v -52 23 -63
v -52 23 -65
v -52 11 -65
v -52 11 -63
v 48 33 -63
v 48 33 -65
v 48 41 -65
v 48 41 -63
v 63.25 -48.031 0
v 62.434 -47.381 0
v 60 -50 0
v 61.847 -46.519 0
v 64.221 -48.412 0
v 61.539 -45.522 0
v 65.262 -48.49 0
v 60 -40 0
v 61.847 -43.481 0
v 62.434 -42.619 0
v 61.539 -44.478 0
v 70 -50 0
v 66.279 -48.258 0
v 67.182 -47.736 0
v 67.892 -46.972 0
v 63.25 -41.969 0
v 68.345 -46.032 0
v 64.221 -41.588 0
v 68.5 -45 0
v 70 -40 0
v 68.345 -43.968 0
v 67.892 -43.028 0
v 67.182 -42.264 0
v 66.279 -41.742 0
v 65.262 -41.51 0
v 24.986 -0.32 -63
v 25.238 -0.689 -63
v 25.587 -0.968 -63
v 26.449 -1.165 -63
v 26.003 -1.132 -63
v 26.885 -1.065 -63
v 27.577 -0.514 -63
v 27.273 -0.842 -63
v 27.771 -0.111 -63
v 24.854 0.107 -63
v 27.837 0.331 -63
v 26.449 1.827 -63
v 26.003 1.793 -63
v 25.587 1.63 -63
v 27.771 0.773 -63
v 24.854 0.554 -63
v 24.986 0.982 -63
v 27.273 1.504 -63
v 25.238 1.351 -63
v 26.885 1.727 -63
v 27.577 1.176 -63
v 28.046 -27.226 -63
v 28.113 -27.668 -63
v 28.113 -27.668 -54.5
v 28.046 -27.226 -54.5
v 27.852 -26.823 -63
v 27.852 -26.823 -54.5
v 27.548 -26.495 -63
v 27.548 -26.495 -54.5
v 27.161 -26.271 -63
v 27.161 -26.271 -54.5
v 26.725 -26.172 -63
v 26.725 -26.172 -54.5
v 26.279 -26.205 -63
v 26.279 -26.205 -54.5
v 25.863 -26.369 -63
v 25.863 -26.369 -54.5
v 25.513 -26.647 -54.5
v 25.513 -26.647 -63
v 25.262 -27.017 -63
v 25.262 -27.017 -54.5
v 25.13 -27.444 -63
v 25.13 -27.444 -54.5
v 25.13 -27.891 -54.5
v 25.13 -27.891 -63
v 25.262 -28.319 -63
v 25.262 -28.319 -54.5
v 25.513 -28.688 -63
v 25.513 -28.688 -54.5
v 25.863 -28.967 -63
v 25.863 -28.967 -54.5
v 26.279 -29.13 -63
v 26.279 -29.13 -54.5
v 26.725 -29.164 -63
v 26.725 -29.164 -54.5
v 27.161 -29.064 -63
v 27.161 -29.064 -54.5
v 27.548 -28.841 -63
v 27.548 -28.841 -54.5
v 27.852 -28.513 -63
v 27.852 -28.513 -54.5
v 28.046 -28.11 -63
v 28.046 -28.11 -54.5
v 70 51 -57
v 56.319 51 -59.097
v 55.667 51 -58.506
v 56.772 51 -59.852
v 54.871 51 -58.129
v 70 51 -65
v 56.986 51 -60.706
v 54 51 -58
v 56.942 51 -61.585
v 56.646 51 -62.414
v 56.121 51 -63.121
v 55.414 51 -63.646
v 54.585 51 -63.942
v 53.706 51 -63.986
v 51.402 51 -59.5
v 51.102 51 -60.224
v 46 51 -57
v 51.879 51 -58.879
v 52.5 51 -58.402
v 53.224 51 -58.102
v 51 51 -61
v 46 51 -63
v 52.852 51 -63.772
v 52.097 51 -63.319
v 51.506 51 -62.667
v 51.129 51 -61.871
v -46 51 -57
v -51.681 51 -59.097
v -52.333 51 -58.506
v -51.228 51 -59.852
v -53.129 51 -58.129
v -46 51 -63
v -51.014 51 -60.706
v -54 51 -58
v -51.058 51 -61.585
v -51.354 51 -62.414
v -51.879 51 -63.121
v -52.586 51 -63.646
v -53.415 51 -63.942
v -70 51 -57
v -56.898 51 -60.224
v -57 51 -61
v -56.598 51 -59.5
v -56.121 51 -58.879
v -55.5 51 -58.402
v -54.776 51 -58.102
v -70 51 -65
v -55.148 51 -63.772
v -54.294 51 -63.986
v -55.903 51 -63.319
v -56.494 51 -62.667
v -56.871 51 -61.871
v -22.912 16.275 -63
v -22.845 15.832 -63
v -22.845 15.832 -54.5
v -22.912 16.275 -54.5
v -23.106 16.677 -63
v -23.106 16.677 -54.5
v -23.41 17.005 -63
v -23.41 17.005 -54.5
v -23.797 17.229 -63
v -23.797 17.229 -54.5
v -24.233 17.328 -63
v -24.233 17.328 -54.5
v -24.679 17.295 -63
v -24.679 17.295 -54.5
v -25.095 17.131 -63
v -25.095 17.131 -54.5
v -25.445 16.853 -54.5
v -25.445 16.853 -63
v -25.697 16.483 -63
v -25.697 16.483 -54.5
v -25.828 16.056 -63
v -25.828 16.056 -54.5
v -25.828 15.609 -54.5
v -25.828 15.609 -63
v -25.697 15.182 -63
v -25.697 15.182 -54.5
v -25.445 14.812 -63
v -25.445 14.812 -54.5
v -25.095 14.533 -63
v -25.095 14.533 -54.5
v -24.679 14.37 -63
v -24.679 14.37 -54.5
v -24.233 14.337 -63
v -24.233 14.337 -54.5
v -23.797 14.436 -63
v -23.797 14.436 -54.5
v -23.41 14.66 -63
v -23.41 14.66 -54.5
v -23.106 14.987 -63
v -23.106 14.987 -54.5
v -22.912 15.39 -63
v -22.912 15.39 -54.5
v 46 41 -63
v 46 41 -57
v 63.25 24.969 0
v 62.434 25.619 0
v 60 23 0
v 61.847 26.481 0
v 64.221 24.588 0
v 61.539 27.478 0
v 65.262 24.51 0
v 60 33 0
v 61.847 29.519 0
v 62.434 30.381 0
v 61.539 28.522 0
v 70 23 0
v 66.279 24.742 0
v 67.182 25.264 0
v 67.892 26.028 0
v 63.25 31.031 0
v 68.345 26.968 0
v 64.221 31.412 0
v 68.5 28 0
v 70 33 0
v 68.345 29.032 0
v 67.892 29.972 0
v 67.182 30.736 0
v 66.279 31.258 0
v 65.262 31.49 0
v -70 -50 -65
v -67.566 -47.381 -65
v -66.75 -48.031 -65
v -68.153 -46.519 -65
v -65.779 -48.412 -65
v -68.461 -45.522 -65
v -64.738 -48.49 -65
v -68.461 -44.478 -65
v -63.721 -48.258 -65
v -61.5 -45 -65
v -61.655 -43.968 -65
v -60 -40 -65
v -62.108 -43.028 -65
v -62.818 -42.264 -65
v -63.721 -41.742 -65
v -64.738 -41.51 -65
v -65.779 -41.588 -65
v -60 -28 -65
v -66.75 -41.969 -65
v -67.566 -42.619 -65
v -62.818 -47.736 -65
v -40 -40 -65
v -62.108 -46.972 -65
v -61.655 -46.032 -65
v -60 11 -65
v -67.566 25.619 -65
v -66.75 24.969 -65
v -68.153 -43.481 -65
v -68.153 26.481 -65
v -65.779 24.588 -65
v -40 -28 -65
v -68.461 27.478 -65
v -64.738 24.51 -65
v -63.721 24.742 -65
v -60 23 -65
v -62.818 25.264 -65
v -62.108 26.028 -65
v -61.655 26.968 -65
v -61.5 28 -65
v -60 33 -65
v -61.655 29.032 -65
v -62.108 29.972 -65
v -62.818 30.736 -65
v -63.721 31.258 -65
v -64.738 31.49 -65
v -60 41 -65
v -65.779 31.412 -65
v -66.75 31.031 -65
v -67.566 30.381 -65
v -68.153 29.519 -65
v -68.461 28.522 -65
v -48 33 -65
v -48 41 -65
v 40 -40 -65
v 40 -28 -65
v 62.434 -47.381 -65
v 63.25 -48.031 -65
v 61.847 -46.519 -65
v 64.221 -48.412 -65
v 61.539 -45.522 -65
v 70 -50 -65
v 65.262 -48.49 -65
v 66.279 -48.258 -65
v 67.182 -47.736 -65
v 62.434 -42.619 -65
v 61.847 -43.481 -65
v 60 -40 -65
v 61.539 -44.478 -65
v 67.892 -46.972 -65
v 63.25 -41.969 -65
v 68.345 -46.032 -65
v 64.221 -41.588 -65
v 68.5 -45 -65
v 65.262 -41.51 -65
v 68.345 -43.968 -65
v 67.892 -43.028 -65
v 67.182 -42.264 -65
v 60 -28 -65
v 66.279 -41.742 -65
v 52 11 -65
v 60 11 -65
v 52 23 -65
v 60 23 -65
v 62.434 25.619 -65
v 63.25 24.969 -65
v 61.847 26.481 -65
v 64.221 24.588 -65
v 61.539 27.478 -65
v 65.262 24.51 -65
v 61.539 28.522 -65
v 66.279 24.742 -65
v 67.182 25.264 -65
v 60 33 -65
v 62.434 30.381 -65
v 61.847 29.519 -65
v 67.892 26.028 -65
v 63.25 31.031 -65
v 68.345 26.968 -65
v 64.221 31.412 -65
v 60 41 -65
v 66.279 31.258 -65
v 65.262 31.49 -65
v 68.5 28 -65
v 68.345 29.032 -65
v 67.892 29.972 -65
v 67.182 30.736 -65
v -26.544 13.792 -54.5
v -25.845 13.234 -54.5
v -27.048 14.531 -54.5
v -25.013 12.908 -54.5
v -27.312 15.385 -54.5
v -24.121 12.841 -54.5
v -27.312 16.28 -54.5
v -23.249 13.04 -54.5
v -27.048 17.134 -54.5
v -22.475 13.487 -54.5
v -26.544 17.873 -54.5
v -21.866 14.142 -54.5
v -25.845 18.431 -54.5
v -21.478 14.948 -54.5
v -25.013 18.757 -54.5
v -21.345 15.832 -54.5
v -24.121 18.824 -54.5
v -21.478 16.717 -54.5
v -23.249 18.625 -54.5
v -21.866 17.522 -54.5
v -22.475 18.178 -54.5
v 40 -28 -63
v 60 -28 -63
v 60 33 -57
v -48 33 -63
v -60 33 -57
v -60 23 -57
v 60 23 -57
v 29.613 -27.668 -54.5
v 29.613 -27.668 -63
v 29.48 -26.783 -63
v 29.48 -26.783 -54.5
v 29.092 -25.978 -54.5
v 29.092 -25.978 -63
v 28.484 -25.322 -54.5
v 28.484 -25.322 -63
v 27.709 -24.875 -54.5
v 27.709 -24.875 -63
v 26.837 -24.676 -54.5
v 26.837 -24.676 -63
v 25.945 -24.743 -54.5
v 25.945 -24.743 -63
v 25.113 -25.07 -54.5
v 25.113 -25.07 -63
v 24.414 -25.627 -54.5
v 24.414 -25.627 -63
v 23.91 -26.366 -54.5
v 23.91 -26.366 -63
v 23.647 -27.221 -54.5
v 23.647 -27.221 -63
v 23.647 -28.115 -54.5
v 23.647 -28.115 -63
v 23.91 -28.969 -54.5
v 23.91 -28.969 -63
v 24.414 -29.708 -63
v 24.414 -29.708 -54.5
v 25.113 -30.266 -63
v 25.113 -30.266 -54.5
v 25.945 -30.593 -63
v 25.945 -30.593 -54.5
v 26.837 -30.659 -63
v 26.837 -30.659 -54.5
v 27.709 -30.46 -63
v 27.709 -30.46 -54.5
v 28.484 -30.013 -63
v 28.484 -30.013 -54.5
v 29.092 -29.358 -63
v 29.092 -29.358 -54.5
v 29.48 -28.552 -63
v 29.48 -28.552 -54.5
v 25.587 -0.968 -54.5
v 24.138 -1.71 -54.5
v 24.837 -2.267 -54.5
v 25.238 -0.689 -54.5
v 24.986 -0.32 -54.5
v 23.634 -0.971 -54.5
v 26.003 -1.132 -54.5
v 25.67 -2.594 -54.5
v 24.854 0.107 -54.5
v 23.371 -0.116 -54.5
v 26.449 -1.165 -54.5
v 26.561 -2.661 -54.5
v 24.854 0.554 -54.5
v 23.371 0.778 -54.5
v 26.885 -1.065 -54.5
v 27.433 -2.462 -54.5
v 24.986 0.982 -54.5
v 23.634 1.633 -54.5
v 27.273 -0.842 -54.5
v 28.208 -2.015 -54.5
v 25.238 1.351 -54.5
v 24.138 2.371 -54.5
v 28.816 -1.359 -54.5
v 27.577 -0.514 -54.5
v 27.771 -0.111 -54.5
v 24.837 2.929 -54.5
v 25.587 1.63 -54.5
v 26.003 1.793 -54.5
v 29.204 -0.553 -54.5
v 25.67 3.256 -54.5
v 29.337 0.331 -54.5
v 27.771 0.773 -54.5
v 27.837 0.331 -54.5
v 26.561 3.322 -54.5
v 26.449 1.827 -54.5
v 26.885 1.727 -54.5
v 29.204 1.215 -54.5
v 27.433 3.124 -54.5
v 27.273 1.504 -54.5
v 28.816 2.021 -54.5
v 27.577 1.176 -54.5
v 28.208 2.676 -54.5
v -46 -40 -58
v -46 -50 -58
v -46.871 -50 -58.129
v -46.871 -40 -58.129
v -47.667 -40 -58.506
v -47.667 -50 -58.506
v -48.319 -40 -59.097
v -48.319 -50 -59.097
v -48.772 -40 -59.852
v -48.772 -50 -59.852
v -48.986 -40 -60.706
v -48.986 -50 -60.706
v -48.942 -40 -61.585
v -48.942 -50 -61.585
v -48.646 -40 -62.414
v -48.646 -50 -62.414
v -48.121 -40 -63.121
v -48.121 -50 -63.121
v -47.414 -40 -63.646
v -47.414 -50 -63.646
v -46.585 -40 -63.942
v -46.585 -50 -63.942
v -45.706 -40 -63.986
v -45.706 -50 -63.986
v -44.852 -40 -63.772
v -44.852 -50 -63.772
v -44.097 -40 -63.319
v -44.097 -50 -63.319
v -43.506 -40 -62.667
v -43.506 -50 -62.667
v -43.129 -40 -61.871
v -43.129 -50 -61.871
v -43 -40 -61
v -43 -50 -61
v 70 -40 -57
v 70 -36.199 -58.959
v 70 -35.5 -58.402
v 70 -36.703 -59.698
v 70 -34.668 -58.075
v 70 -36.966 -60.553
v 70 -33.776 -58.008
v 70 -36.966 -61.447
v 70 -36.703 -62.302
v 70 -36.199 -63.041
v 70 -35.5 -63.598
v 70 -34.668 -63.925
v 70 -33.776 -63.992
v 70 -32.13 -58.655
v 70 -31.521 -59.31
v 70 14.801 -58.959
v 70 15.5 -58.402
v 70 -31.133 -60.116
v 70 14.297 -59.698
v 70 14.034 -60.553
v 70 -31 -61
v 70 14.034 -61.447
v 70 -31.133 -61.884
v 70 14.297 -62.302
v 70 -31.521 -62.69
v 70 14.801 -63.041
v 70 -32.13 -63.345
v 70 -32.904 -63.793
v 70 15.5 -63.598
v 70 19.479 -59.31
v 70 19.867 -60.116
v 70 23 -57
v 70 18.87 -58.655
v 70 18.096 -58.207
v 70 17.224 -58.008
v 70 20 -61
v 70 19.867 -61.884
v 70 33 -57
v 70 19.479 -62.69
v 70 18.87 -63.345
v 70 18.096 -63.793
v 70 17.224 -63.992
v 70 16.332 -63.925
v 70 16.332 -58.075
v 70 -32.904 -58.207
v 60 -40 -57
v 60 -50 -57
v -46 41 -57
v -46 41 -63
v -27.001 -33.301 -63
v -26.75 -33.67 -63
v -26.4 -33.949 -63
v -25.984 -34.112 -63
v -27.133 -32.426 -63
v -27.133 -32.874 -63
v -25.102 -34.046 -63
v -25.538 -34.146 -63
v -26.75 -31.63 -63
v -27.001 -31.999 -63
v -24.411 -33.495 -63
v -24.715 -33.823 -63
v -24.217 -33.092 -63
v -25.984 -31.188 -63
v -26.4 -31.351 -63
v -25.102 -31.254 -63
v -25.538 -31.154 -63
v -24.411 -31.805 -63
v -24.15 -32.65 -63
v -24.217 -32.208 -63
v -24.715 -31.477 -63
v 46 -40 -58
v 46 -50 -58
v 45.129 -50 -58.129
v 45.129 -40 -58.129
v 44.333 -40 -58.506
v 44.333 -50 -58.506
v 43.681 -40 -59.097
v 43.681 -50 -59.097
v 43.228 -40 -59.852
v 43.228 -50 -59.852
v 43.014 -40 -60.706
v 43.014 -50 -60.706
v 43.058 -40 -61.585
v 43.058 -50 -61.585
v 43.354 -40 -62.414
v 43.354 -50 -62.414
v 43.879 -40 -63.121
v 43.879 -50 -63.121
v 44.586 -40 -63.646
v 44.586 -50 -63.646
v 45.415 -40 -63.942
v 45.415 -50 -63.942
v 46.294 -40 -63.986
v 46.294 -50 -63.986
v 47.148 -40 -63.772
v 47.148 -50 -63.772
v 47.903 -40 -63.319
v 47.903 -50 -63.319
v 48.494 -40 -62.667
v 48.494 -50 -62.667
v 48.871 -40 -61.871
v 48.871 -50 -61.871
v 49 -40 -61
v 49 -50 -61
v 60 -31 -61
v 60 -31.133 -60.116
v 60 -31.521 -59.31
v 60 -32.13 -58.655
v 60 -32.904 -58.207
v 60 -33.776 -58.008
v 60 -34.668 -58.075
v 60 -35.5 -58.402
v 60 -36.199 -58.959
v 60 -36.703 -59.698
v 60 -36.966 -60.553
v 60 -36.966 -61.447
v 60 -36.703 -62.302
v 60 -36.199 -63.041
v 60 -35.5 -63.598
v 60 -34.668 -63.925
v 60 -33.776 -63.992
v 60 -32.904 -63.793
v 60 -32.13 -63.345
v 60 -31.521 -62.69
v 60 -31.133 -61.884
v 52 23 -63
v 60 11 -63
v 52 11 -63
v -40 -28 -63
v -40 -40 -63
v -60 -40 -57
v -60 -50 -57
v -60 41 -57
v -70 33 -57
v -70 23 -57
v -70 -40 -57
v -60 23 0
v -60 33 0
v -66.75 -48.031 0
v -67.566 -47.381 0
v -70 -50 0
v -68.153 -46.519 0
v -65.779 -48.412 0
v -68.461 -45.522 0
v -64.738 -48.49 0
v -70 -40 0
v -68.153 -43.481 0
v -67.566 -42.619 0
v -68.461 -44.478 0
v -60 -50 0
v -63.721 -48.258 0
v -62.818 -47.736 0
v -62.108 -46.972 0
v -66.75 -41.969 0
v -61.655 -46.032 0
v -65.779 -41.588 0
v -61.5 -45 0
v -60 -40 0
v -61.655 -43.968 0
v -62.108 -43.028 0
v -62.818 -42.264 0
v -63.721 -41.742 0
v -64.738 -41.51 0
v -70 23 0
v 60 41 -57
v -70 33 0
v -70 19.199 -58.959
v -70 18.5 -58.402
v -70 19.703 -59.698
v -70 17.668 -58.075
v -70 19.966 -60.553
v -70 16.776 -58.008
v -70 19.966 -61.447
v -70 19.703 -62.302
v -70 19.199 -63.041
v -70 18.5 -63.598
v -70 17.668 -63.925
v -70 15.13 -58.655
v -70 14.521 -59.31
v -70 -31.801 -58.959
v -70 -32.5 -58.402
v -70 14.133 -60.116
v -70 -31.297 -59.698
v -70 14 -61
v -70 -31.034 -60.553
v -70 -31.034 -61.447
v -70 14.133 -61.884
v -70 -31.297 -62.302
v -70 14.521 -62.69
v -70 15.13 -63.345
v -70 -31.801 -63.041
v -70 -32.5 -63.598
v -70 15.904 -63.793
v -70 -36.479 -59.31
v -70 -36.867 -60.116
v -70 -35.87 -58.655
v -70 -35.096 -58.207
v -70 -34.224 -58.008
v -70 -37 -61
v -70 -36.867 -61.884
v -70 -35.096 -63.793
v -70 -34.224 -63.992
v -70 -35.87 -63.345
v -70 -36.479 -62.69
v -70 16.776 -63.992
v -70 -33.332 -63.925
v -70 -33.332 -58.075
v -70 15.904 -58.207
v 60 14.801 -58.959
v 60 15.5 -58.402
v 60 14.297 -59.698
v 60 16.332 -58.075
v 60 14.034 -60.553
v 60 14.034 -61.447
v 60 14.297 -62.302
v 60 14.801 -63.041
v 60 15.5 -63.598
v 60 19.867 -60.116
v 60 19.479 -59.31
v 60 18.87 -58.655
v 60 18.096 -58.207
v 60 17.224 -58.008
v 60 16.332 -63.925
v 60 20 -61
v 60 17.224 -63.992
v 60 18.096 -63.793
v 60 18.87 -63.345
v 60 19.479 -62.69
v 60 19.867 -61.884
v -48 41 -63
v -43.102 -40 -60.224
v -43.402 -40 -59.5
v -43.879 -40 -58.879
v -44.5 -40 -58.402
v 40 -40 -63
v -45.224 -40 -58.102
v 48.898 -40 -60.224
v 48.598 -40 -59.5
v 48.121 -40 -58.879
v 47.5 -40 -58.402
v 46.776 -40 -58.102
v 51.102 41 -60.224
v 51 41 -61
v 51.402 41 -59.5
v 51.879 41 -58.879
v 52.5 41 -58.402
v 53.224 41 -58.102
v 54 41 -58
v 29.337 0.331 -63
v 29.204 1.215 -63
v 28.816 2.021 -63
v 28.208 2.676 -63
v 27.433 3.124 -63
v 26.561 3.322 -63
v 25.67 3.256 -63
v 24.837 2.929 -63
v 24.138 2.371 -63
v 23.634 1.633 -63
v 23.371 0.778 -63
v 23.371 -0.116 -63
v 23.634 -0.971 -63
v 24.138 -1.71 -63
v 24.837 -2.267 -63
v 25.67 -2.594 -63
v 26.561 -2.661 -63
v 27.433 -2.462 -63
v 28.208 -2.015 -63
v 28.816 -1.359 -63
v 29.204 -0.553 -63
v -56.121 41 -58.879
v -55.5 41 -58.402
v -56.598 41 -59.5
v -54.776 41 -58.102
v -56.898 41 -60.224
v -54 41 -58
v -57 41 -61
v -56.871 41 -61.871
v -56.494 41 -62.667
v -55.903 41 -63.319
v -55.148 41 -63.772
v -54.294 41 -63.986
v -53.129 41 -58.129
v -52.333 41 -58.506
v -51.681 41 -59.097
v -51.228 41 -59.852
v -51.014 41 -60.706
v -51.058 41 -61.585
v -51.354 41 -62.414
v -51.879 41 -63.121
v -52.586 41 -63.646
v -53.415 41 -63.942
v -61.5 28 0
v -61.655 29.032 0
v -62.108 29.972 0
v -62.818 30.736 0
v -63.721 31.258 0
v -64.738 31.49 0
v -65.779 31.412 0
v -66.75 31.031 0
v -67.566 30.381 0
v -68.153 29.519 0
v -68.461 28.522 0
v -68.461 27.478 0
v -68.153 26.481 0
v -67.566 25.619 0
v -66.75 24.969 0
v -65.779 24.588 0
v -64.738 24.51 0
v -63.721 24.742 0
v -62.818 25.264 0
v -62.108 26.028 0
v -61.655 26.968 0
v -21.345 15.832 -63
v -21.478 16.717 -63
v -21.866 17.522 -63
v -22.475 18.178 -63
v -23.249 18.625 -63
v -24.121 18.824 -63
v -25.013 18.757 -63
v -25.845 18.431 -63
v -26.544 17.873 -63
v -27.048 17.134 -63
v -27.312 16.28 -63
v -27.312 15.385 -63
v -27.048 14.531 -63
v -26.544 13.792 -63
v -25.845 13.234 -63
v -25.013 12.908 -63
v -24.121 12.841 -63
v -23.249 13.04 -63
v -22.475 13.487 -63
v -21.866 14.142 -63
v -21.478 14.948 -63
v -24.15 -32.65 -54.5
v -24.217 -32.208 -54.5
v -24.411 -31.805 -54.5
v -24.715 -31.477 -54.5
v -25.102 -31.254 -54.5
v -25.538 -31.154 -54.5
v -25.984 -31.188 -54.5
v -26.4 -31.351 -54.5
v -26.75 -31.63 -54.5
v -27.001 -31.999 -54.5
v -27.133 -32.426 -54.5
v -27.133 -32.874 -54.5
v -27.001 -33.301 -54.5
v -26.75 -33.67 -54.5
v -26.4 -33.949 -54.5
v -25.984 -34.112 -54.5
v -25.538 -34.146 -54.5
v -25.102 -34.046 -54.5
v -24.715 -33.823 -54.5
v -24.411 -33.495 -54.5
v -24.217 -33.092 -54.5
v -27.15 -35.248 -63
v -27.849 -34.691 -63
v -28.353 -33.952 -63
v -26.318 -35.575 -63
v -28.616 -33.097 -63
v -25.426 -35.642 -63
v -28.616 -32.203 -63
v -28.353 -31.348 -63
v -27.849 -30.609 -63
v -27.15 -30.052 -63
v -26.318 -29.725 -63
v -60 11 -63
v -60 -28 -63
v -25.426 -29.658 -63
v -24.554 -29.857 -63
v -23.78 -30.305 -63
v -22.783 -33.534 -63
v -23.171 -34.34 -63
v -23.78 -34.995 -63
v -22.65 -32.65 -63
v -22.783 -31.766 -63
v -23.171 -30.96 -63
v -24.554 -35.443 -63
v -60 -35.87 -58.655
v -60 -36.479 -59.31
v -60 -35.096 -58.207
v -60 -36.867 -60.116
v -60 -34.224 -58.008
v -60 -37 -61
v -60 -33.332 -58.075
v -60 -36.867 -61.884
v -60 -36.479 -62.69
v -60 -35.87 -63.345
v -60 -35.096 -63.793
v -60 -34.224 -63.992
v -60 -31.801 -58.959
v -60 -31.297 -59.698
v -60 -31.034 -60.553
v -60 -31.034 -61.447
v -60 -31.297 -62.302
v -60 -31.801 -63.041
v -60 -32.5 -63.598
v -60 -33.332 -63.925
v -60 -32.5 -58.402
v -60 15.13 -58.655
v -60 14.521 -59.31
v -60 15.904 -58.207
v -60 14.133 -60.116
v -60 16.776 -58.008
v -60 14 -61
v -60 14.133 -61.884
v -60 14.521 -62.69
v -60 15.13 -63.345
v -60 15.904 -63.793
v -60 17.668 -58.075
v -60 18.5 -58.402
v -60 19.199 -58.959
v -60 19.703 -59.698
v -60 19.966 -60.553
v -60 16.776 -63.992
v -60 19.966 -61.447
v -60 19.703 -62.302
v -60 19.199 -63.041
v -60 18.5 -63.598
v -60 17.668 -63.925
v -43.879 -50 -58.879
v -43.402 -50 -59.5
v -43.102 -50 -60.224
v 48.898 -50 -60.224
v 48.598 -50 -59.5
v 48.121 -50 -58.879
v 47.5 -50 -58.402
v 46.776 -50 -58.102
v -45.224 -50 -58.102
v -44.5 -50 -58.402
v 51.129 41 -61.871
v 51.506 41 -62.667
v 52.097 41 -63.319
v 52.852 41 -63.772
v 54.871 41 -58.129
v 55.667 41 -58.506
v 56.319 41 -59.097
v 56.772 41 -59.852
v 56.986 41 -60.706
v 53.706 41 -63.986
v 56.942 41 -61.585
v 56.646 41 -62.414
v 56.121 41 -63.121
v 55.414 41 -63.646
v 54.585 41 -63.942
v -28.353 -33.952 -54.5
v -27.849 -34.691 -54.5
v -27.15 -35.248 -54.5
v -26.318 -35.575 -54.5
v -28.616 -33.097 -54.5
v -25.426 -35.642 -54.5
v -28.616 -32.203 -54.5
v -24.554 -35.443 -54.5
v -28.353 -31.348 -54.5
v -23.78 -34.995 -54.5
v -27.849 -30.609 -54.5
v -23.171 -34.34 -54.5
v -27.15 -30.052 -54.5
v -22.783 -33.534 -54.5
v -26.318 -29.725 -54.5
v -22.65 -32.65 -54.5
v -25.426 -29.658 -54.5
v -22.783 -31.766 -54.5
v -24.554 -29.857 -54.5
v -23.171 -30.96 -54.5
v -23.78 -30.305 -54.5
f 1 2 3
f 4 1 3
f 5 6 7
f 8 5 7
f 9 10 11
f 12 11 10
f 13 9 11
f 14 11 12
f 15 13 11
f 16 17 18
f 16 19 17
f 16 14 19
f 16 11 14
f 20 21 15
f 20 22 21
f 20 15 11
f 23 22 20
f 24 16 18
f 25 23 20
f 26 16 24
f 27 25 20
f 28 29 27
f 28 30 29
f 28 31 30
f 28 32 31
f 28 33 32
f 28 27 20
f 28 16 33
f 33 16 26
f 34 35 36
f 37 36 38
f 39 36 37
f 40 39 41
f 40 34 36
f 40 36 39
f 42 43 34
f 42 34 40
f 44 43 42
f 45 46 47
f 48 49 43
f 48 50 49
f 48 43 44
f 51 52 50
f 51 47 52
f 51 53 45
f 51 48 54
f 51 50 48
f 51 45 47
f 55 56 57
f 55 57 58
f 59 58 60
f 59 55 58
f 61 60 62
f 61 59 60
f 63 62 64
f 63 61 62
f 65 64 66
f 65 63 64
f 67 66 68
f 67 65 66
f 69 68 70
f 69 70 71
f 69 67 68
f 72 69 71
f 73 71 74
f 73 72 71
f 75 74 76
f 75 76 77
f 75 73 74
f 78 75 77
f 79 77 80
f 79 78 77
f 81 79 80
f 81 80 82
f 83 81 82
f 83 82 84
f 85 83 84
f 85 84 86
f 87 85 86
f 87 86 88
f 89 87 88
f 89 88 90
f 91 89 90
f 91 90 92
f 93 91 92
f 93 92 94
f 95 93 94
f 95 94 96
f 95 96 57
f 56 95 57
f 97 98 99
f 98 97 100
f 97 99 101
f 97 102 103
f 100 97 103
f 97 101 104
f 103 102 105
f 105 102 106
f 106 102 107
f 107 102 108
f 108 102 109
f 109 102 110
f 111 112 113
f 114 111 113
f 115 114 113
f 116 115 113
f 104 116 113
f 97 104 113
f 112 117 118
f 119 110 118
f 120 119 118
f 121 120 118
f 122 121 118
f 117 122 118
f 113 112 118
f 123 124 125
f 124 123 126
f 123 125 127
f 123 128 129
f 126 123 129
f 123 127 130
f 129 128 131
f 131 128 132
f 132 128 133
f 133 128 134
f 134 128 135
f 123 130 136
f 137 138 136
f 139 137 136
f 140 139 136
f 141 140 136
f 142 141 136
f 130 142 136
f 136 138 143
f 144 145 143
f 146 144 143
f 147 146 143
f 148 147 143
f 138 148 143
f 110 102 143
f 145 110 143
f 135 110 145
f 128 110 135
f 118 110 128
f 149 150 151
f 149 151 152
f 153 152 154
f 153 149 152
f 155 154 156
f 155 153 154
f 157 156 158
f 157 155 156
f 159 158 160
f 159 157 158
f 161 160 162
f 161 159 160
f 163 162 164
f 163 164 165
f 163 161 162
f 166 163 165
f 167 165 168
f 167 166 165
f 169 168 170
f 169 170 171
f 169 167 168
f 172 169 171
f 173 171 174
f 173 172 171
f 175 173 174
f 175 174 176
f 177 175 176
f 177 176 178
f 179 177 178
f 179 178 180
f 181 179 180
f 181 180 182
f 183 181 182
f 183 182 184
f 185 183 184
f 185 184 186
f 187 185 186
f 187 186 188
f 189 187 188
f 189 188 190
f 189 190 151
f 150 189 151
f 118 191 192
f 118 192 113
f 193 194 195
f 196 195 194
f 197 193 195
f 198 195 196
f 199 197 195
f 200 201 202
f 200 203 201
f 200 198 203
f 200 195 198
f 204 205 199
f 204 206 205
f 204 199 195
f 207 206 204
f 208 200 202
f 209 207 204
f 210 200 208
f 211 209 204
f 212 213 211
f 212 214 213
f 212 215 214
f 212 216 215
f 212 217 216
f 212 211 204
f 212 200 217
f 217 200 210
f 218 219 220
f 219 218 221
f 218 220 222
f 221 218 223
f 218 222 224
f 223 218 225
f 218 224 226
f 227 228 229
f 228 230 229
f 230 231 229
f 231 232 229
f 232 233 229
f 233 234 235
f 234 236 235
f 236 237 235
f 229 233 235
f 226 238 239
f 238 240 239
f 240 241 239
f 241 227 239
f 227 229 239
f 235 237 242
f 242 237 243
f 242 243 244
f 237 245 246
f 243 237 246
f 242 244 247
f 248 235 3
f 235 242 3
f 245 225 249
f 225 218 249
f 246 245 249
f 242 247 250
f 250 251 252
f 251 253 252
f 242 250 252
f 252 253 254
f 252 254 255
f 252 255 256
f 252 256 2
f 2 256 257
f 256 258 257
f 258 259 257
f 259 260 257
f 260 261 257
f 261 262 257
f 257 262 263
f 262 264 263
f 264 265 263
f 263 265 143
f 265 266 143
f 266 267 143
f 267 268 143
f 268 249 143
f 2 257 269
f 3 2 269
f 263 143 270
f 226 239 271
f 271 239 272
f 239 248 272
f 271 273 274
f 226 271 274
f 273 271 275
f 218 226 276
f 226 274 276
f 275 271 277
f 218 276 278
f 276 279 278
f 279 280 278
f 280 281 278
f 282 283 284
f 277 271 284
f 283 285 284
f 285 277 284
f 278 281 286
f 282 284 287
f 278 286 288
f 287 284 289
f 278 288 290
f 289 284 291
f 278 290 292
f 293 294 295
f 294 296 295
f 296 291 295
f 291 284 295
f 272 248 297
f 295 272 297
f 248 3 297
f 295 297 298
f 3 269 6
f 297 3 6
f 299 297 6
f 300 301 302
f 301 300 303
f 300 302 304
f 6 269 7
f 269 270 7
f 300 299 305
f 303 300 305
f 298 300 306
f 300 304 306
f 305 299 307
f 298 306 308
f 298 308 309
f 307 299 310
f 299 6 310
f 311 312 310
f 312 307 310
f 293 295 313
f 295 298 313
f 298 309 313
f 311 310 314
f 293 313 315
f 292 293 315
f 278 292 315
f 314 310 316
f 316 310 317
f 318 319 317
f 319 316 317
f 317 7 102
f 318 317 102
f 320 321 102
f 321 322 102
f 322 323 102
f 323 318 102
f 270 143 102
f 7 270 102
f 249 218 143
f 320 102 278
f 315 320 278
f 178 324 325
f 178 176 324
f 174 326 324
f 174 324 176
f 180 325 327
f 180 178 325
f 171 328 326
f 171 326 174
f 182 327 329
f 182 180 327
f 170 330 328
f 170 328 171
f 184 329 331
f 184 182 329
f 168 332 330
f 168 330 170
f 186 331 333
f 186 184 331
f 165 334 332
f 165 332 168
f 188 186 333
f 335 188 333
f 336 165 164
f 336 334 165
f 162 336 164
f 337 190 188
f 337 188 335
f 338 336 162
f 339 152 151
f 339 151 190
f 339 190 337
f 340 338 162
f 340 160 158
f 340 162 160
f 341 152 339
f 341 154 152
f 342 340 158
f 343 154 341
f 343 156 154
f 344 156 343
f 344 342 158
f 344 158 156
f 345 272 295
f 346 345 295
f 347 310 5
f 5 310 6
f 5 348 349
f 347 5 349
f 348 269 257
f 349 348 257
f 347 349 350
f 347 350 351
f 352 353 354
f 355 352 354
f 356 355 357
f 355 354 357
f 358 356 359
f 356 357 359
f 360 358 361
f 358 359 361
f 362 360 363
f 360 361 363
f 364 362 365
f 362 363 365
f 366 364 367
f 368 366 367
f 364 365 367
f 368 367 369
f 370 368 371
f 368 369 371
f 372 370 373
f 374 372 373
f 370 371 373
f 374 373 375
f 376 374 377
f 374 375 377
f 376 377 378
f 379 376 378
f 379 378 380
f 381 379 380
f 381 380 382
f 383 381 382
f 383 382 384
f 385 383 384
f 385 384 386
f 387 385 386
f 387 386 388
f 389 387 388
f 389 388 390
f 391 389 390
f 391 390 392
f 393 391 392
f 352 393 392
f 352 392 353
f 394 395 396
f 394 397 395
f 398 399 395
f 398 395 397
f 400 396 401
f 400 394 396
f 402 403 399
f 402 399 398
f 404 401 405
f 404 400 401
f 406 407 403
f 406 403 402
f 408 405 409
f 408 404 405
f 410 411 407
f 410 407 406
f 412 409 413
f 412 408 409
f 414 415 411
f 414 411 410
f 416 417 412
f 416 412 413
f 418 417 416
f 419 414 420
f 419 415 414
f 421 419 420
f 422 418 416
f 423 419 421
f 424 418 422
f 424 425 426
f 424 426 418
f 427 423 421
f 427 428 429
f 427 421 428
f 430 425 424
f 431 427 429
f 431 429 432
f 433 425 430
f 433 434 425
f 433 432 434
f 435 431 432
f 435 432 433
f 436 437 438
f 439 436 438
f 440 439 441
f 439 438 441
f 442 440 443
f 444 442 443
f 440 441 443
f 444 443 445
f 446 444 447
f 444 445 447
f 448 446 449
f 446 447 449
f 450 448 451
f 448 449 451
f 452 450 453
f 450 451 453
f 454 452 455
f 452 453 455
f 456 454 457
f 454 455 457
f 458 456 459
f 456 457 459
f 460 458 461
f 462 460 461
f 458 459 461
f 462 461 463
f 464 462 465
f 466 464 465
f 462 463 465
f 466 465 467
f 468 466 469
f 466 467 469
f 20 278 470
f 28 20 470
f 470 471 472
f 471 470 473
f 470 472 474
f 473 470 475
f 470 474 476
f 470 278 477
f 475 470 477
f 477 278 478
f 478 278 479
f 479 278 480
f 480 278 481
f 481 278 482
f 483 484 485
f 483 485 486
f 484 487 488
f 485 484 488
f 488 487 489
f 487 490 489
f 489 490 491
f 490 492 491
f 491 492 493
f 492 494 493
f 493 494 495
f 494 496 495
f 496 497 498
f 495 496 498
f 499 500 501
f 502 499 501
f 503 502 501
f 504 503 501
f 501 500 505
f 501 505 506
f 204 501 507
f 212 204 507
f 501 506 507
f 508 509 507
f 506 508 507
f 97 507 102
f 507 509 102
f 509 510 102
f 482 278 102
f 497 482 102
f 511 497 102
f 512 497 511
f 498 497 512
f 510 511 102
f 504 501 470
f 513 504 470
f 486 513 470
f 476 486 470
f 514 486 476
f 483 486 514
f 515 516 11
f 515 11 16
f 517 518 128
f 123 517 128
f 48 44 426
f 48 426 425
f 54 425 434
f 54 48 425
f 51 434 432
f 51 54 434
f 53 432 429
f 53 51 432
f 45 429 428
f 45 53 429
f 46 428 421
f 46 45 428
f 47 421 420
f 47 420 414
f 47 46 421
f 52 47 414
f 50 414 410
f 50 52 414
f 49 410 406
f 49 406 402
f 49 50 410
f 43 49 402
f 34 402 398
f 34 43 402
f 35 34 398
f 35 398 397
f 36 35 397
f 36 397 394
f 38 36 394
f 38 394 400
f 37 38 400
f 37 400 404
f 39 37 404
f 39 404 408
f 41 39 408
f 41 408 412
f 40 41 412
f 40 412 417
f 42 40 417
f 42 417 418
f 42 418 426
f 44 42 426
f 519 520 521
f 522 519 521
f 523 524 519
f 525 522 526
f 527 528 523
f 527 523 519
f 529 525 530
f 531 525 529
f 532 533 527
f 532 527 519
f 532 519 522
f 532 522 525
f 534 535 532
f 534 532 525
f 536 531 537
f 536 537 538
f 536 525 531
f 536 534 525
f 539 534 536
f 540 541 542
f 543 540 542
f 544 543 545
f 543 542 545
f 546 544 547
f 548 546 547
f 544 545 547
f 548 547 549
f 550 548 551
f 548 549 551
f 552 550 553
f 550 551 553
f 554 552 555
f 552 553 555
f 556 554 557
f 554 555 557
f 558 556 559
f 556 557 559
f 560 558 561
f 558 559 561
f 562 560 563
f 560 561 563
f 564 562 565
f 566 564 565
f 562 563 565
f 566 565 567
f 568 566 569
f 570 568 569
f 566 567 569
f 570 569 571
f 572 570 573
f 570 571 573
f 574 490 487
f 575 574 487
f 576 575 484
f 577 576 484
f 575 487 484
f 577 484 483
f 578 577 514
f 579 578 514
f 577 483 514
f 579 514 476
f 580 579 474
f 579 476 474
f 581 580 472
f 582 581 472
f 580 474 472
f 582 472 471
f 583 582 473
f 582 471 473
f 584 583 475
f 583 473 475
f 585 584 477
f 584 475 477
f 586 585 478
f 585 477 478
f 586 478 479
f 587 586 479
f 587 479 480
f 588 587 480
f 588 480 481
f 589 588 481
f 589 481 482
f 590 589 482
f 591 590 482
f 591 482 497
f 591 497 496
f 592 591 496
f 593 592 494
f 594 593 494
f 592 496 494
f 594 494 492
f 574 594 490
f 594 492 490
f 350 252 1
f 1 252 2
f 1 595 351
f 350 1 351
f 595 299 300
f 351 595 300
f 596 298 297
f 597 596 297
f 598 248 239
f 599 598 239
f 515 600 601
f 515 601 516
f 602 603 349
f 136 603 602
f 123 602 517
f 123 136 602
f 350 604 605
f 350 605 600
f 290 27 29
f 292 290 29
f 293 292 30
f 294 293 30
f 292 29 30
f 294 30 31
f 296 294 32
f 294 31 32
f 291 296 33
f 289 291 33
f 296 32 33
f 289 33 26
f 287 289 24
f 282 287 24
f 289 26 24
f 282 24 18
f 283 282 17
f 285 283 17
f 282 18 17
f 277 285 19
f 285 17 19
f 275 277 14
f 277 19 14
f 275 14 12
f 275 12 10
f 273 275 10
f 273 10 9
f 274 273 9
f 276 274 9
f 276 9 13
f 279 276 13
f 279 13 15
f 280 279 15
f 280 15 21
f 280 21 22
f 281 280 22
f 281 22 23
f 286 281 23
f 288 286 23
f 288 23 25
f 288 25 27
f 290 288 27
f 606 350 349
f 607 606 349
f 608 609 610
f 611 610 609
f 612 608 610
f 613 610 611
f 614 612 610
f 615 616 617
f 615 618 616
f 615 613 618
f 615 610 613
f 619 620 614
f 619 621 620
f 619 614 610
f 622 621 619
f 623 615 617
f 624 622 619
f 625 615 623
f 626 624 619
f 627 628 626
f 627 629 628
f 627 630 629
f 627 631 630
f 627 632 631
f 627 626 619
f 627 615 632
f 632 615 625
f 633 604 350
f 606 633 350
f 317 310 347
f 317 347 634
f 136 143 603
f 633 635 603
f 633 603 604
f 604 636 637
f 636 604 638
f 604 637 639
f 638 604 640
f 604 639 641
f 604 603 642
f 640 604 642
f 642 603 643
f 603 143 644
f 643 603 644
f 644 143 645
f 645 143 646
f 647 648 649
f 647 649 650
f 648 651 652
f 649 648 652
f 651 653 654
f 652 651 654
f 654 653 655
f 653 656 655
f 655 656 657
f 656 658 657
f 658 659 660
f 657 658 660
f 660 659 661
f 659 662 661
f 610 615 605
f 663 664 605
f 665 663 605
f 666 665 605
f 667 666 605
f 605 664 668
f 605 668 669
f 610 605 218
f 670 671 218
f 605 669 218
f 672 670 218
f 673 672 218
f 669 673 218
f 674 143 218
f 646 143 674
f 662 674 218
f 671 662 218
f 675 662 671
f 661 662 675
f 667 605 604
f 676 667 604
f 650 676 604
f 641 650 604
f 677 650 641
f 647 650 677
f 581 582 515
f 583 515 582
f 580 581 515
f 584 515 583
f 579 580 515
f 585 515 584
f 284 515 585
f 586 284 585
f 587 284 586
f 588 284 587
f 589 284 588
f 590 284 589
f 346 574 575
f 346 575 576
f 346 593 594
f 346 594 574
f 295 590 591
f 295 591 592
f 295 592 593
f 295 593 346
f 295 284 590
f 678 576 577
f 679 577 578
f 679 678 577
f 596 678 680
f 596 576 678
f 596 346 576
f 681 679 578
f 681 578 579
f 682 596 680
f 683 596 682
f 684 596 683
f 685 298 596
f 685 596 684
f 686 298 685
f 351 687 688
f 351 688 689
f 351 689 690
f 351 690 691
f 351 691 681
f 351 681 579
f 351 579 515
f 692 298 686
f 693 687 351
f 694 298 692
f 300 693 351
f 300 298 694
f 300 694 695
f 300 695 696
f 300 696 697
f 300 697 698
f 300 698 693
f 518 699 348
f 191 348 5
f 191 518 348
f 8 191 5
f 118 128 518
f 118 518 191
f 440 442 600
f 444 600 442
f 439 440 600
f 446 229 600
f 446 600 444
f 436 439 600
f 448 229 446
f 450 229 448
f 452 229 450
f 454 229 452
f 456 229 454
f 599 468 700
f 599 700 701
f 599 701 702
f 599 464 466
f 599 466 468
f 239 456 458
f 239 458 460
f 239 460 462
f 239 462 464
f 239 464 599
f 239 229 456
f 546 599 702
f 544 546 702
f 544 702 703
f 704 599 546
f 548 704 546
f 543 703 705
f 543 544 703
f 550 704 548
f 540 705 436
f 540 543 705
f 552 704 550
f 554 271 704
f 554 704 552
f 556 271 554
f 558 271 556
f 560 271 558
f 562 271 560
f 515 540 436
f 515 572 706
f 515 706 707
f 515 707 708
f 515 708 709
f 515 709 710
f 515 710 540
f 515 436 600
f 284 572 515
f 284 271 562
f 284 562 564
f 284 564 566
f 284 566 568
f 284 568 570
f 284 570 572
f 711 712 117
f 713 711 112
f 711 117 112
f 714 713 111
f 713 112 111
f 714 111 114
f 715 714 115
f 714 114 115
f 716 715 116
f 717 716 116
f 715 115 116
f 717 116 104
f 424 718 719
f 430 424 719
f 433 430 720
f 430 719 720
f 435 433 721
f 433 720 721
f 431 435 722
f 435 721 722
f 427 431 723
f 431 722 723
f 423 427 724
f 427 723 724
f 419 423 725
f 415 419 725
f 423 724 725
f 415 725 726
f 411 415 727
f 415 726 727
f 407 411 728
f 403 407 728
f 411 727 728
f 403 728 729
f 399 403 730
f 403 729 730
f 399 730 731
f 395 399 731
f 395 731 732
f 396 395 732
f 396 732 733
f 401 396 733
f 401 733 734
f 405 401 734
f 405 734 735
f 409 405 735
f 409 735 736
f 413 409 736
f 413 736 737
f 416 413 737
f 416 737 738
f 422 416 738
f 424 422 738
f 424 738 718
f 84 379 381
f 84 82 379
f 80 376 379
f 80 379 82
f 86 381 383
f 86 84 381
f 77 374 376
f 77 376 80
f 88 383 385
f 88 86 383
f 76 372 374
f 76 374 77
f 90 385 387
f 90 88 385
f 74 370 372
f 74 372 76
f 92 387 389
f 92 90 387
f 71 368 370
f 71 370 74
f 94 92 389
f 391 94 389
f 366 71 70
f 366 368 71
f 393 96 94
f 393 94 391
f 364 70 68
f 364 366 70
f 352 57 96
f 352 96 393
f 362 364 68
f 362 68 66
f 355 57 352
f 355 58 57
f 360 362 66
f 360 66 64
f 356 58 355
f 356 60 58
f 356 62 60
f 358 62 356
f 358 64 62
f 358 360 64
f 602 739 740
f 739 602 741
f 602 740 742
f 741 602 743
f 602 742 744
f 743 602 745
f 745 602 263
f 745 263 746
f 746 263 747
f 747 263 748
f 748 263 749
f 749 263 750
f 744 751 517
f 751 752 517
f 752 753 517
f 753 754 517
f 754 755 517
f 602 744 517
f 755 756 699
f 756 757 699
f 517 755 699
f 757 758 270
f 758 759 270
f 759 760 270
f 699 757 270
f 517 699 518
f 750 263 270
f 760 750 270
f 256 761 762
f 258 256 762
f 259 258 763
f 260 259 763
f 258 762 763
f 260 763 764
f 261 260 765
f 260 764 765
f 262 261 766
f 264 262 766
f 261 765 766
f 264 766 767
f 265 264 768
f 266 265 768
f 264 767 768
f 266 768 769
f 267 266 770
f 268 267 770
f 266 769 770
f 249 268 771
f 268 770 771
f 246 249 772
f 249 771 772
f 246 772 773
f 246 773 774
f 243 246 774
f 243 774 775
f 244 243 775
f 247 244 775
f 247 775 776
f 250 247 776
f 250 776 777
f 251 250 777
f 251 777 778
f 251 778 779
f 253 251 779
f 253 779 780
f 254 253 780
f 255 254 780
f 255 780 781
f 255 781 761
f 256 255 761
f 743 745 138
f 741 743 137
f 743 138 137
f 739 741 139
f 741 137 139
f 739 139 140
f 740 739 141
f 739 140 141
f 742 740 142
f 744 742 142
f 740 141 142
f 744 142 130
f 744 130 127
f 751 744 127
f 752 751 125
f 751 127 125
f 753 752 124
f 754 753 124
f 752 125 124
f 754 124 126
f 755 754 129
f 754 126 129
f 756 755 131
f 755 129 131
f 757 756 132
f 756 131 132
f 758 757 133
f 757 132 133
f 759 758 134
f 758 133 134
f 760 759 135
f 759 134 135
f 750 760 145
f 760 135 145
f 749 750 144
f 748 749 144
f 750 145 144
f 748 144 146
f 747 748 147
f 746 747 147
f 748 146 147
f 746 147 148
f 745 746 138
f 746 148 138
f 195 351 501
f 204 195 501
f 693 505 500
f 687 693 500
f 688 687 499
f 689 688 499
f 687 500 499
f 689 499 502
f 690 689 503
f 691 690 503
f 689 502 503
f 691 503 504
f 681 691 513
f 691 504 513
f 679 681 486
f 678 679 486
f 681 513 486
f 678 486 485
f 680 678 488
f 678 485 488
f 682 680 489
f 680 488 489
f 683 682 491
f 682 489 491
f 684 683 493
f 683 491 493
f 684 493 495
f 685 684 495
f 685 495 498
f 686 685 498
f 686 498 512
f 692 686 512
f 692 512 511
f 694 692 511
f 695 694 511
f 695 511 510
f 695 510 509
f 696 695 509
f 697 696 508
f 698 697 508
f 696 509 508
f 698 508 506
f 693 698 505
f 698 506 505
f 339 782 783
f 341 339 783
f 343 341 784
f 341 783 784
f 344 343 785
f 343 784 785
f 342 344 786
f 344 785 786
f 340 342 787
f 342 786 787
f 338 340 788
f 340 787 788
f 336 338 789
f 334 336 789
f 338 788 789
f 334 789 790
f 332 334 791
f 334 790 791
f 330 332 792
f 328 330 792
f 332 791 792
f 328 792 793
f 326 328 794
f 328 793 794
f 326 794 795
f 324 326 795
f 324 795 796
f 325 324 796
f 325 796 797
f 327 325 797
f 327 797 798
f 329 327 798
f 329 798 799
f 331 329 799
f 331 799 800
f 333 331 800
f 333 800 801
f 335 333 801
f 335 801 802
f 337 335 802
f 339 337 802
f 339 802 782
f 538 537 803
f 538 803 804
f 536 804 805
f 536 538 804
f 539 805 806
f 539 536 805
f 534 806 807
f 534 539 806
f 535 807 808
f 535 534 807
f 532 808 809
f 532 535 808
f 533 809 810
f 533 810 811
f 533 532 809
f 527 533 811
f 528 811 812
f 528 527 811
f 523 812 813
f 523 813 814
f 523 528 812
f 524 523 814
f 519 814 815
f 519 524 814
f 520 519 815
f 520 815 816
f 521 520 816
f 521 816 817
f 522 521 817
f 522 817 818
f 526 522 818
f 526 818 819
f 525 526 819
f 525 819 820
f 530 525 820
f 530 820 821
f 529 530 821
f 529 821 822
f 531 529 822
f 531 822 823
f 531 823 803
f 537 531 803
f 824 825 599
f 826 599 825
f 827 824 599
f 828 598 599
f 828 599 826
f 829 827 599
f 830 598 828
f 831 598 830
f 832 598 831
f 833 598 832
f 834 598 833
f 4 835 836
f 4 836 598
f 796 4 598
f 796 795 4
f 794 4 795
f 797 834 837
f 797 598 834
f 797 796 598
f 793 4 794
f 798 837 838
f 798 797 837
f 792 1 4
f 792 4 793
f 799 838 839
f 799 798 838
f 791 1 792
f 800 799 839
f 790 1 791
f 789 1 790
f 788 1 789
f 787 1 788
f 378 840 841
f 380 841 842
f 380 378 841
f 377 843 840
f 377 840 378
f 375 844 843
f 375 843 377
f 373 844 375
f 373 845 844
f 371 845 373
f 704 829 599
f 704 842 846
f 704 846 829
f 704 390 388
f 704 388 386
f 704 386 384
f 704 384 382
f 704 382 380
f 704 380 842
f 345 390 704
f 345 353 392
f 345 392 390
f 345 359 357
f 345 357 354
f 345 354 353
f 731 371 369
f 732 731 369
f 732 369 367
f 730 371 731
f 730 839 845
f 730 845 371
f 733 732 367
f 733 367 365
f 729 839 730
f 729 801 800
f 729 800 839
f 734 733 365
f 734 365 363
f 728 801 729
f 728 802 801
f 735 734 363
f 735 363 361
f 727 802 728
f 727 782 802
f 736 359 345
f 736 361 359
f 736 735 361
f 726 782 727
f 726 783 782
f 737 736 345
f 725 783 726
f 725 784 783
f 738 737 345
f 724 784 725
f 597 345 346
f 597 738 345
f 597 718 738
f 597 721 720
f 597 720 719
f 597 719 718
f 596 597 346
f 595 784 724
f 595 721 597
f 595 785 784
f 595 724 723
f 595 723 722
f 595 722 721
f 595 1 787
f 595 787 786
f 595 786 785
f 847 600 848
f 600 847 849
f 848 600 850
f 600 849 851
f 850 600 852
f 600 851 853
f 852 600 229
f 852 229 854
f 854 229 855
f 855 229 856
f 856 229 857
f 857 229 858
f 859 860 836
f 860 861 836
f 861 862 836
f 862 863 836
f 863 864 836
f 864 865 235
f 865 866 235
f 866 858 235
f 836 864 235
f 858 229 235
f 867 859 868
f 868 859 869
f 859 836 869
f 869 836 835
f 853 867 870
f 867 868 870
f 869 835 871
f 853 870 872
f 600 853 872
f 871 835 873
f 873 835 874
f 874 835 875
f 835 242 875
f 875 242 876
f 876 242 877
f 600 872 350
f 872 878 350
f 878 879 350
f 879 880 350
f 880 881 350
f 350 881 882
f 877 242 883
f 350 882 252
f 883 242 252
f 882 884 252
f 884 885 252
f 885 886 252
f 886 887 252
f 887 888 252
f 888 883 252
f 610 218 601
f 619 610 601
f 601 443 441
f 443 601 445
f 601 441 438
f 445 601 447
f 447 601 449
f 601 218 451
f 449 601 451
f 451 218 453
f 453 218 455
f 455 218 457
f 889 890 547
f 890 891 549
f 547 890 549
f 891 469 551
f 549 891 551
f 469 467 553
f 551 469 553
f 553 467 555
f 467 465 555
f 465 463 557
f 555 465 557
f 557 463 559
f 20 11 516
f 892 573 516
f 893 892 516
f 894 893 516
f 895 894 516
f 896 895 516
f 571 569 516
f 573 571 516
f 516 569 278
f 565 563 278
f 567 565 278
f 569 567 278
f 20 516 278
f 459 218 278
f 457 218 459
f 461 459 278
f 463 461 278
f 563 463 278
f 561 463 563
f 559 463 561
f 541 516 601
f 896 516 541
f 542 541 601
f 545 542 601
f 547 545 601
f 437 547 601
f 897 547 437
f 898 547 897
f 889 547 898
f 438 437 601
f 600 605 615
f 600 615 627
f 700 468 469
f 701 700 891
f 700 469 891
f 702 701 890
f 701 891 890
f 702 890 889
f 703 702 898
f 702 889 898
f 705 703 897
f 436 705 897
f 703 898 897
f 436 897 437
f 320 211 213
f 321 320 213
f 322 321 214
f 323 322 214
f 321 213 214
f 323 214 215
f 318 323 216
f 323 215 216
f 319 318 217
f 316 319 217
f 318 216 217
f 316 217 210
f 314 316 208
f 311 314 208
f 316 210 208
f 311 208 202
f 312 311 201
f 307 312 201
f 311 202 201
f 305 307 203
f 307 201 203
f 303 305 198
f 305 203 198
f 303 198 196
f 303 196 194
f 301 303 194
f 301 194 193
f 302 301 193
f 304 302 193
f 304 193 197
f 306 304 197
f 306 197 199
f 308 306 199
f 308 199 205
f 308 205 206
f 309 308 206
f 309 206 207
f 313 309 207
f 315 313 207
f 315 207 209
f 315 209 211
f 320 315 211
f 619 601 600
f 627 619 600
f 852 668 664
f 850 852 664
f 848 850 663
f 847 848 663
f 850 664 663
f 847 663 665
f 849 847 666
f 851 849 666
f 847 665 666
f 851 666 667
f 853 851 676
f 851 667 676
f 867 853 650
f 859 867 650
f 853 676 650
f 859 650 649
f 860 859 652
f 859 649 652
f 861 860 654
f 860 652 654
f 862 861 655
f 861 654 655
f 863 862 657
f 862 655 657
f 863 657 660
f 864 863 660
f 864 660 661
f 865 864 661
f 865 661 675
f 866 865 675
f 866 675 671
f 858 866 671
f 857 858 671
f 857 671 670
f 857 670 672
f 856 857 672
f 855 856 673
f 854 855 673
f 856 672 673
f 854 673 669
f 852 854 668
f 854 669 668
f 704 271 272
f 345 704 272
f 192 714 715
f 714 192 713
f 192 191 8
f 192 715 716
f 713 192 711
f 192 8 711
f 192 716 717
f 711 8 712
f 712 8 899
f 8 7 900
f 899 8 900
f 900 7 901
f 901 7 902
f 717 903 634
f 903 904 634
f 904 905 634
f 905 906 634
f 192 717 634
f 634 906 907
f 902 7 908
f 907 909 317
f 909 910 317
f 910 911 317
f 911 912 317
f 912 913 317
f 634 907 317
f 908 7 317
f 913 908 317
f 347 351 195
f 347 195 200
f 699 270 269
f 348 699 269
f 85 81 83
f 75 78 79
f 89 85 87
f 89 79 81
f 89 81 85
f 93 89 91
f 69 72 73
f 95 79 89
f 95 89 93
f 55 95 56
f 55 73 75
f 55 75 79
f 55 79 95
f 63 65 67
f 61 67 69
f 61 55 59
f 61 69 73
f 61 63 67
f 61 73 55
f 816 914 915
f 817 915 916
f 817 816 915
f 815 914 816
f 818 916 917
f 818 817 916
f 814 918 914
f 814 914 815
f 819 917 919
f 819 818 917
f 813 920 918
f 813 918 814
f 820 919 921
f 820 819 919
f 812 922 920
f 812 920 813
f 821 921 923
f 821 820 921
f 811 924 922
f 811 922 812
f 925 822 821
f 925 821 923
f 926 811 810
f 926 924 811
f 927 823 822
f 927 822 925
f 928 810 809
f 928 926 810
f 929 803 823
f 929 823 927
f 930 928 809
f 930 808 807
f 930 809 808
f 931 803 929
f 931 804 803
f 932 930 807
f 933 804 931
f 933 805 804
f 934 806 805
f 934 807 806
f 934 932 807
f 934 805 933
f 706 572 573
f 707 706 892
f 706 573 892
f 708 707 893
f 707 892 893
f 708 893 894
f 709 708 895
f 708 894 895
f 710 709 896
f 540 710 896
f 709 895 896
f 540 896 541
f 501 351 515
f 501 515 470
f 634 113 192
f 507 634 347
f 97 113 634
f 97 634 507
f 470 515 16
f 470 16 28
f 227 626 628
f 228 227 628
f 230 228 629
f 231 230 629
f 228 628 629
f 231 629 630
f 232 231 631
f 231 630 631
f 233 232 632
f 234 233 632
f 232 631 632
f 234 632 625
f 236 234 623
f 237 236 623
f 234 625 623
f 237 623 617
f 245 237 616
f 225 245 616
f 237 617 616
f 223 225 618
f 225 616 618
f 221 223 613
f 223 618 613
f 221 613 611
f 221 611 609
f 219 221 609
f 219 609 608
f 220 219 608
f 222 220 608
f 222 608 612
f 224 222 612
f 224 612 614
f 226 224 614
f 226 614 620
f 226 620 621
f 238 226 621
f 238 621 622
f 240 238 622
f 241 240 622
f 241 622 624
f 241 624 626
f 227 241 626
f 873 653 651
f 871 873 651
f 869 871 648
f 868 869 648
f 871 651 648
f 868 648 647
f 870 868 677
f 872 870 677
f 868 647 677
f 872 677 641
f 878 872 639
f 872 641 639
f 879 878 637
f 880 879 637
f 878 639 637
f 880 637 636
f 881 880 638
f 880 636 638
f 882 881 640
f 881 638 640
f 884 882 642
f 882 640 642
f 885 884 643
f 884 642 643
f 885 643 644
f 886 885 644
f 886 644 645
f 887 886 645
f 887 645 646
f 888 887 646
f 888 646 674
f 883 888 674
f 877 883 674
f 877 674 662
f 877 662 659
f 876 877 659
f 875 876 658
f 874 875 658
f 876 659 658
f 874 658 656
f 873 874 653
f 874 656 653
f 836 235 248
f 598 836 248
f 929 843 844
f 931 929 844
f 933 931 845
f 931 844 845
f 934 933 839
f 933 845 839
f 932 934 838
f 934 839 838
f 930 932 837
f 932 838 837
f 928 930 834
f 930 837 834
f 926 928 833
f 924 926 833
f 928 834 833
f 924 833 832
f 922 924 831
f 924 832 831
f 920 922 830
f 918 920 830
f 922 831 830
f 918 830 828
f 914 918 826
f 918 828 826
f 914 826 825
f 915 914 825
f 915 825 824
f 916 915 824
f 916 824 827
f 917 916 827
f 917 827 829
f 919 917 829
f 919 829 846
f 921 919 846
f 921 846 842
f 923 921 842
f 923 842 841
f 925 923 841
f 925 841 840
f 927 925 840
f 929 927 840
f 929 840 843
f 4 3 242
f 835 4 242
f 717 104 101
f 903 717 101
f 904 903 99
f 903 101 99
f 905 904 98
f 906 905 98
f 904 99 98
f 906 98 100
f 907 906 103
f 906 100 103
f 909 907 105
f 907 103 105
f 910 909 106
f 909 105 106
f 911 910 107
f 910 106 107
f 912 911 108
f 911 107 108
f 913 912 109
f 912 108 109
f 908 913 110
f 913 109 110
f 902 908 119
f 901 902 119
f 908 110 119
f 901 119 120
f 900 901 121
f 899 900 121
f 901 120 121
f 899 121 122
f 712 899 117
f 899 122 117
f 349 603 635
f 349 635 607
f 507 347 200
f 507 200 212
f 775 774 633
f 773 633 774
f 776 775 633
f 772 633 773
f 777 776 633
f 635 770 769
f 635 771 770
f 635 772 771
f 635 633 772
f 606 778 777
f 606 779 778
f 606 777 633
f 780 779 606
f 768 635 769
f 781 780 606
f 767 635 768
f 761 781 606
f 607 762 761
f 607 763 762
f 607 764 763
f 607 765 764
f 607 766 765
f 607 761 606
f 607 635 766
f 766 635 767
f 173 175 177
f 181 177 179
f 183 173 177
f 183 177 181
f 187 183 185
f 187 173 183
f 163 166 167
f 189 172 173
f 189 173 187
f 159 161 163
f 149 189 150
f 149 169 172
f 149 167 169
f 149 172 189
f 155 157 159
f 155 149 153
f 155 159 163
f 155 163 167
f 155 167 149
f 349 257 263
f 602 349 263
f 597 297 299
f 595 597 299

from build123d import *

# Parameters (mm, degrees)
F0_W      = 10
F0_H      = 10
F1_DEPTH  = 60
F3_W      = 10
F3_H      = 8
F3_W_2    = 120
F3_H_2    = 63
F3_H_3    = 10
F3_W_3    = 14
F4_DEPTH  = 8
F6_DEPTH  = 2
F7_R      = 3
F7_R_2    = 1.5
F8_DEPTH  = 10.5
F9_R      = 3.5
F10_DEPTH = 75
F11_R     = 3
F12_DEPTH = 10
F13_R     = 3
F14_DEPTH = 10
F16_DEPTH = 10
F18_DEPTH = 10


with BuildPart() as f1:
    # F0 (on Top) → F1 (new body)
    with BuildSketch(Plane.XY):
        with Locations((-65, 28)):
            Rectangle(F0_W, F0_H)
        with Locations((65, 28)):
            Rectangle(F0_W, F0_H)
        with Locations((-65, -45)):
            Rectangle(F0_W, F0_H)
        with Locations((65, -45)):
            Rectangle(F0_W, F0_H)
    extrude(amount=-F1_DEPTH)

    # F3 (on offset) → F4 (join)
    with BuildSketch(Plane.XY.offset(-65)):
        with Locations((-65, 37)):
            Rectangle(F3_W, F3_H)
        Polygon((-60, 33), (-70, 33), (-70, 23), (-70, -40), (-70, -50), (-60, -50), (60, -50), (70, -50), (70, -40), (70, 23), (70, 33), (60, 33), align=None)
        with Locations((0, -8.5)):
            Rectangle(F3_W_2, F3_H_2, mode=Mode.SUBTRACT)
        with Locations((-65, 46)):
            Rectangle(F3_W, F3_H_3)
        with Locations((65, 37)):
            Rectangle(F3_W, F3_H)
        with Locations((-53, 46)):
            Rectangle(F3_W_3, F3_H_3)
        with Locations((53, 46)):
            Rectangle(F3_W_3, F3_H_3)
        with Locations((65, 46)):
            Rectangle(F3_W, F3_H_3)
    extrude(amount=F4_DEPTH)

    # F5 (on offset) → F6 (join)
    with BuildSketch(Plane.XY.offset(-65)):
        Polygon((-48, 33), (-52, 33), (-52, 11), (-60, 11), (-60, -28), (-40, -28), (-40, -40), (40, -40), (40, -28), (60, -28), (60, 11), (52, 11), (52, 33), (48, 33), (48, 41), (46, 41), (46, 51), (-46, 51), (-46, 41), (-48, 41), align=None)
    extrude(amount=F6_DEPTH)

    # F7 (on offset) → F8 (join)
    with BuildSketch(Plane.XY.offset(-65)):
        with Locations((-24.34509, 15.832442)):
            Circle(F7_R)
        with Locations((-24.34509, 15.832442)):
            Circle(F7_R_2, mode=Mode.SUBTRACT)
        with Locations((26.337272, 0.330886)):
            Circle(F7_R)
        with Locations((26.337272, 0.330886)):
            Circle(F7_R_2, mode=Mode.SUBTRACT)
        with Locations((26.613058, -27.667755)):
            Circle(F7_R)
        with Locations((26.613058, -27.667755)):
            Circle(F7_R_2, mode=Mode.SUBTRACT)
        with Locations((-25.65, -32.65)):
            Circle(F7_R)
        with Locations((-25.65, -32.65)):
            Circle(F7_R_2, mode=Mode.SUBTRACT)
    extrude(amount=F8_DEPTH)

    # F9 (on Top) → F10 (cut)
    with BuildSketch(Plane.XY):
        with Locations((-65, 28)):
            Circle(F9_R)
        with Locations((-65, -45)):
            Circle(F9_R)
        with Locations((65, -45)):
            Circle(F9_R)
        with Locations((65, 28)):
            Circle(F9_R)
    extrude(amount=-F10_DEPTH, mode=Mode.SUBTRACT)

    # F11 (on face) → F12 (cut)
    with BuildSketch(Plane.YZ.offset(70)):
        with Locations((-34, -61)):
            Circle(F11_R)
        with Locations((17, -61)):
            Circle(F11_R)
    extrude(amount=-F12_DEPTH, mode=Mode.SUBTRACT)

    # F13 (on face) → F14 (cut)
    with BuildSketch(Plane(origin=(-70, 0, 0), x_dir=(0, -1, 0), z_dir=(-1, 0, 0))):
        with Locations((-17, -61)):
            Circle(F13_R)
        with Locations((34, -61)):
            Circle(F13_R)
    extrude(amount=-F14_DEPTH, mode=Mode.SUBTRACT)

    # F15 (on face) → F16 (cut)
    with BuildSketch(Plane.XZ.offset(50)):
        with BuildLine():
            ThreePointArc((-46, -58), (-48.12132, -63.12132), (-43, -61))
            ThreePointArc((-43, -61), (-43.87868, -58.87868), (-46, -58))
        make_face()
        with BuildLine():
            ThreePointArc((46, -58), (43.87868, -63.12132), (49, -61))
            ThreePointArc((49, -61), (48.12132, -58.87868), (46, -58))
        make_face()
    extrude(amount=-F16_DEPTH, mode=Mode.SUBTRACT)

    # F17 (on face) → F18 (cut)
    with BuildSketch(Plane(origin=(0, 51, 0), x_dir=(-1, 0, 0), z_dir=(0, 1, 0))):
        with BuildLine():
            ThreePointArc((-54, -58), (-56.12132, -63.12132), (-51, -61))
            ThreePointArc((-51, -61), (-51.87868, -58.87868), (-54, -58))
        make_face()
        with BuildLine():
            ThreePointArc((54, -58), (51.87868, -63.12132), (57, -61))
            ThreePointArc((57, -61), (56.12132, -58.87868), (54, -58))
        make_face()
    extrude(amount=-F18_DEPTH, mode=Mode.SUBTRACT)


solid = f1.part
